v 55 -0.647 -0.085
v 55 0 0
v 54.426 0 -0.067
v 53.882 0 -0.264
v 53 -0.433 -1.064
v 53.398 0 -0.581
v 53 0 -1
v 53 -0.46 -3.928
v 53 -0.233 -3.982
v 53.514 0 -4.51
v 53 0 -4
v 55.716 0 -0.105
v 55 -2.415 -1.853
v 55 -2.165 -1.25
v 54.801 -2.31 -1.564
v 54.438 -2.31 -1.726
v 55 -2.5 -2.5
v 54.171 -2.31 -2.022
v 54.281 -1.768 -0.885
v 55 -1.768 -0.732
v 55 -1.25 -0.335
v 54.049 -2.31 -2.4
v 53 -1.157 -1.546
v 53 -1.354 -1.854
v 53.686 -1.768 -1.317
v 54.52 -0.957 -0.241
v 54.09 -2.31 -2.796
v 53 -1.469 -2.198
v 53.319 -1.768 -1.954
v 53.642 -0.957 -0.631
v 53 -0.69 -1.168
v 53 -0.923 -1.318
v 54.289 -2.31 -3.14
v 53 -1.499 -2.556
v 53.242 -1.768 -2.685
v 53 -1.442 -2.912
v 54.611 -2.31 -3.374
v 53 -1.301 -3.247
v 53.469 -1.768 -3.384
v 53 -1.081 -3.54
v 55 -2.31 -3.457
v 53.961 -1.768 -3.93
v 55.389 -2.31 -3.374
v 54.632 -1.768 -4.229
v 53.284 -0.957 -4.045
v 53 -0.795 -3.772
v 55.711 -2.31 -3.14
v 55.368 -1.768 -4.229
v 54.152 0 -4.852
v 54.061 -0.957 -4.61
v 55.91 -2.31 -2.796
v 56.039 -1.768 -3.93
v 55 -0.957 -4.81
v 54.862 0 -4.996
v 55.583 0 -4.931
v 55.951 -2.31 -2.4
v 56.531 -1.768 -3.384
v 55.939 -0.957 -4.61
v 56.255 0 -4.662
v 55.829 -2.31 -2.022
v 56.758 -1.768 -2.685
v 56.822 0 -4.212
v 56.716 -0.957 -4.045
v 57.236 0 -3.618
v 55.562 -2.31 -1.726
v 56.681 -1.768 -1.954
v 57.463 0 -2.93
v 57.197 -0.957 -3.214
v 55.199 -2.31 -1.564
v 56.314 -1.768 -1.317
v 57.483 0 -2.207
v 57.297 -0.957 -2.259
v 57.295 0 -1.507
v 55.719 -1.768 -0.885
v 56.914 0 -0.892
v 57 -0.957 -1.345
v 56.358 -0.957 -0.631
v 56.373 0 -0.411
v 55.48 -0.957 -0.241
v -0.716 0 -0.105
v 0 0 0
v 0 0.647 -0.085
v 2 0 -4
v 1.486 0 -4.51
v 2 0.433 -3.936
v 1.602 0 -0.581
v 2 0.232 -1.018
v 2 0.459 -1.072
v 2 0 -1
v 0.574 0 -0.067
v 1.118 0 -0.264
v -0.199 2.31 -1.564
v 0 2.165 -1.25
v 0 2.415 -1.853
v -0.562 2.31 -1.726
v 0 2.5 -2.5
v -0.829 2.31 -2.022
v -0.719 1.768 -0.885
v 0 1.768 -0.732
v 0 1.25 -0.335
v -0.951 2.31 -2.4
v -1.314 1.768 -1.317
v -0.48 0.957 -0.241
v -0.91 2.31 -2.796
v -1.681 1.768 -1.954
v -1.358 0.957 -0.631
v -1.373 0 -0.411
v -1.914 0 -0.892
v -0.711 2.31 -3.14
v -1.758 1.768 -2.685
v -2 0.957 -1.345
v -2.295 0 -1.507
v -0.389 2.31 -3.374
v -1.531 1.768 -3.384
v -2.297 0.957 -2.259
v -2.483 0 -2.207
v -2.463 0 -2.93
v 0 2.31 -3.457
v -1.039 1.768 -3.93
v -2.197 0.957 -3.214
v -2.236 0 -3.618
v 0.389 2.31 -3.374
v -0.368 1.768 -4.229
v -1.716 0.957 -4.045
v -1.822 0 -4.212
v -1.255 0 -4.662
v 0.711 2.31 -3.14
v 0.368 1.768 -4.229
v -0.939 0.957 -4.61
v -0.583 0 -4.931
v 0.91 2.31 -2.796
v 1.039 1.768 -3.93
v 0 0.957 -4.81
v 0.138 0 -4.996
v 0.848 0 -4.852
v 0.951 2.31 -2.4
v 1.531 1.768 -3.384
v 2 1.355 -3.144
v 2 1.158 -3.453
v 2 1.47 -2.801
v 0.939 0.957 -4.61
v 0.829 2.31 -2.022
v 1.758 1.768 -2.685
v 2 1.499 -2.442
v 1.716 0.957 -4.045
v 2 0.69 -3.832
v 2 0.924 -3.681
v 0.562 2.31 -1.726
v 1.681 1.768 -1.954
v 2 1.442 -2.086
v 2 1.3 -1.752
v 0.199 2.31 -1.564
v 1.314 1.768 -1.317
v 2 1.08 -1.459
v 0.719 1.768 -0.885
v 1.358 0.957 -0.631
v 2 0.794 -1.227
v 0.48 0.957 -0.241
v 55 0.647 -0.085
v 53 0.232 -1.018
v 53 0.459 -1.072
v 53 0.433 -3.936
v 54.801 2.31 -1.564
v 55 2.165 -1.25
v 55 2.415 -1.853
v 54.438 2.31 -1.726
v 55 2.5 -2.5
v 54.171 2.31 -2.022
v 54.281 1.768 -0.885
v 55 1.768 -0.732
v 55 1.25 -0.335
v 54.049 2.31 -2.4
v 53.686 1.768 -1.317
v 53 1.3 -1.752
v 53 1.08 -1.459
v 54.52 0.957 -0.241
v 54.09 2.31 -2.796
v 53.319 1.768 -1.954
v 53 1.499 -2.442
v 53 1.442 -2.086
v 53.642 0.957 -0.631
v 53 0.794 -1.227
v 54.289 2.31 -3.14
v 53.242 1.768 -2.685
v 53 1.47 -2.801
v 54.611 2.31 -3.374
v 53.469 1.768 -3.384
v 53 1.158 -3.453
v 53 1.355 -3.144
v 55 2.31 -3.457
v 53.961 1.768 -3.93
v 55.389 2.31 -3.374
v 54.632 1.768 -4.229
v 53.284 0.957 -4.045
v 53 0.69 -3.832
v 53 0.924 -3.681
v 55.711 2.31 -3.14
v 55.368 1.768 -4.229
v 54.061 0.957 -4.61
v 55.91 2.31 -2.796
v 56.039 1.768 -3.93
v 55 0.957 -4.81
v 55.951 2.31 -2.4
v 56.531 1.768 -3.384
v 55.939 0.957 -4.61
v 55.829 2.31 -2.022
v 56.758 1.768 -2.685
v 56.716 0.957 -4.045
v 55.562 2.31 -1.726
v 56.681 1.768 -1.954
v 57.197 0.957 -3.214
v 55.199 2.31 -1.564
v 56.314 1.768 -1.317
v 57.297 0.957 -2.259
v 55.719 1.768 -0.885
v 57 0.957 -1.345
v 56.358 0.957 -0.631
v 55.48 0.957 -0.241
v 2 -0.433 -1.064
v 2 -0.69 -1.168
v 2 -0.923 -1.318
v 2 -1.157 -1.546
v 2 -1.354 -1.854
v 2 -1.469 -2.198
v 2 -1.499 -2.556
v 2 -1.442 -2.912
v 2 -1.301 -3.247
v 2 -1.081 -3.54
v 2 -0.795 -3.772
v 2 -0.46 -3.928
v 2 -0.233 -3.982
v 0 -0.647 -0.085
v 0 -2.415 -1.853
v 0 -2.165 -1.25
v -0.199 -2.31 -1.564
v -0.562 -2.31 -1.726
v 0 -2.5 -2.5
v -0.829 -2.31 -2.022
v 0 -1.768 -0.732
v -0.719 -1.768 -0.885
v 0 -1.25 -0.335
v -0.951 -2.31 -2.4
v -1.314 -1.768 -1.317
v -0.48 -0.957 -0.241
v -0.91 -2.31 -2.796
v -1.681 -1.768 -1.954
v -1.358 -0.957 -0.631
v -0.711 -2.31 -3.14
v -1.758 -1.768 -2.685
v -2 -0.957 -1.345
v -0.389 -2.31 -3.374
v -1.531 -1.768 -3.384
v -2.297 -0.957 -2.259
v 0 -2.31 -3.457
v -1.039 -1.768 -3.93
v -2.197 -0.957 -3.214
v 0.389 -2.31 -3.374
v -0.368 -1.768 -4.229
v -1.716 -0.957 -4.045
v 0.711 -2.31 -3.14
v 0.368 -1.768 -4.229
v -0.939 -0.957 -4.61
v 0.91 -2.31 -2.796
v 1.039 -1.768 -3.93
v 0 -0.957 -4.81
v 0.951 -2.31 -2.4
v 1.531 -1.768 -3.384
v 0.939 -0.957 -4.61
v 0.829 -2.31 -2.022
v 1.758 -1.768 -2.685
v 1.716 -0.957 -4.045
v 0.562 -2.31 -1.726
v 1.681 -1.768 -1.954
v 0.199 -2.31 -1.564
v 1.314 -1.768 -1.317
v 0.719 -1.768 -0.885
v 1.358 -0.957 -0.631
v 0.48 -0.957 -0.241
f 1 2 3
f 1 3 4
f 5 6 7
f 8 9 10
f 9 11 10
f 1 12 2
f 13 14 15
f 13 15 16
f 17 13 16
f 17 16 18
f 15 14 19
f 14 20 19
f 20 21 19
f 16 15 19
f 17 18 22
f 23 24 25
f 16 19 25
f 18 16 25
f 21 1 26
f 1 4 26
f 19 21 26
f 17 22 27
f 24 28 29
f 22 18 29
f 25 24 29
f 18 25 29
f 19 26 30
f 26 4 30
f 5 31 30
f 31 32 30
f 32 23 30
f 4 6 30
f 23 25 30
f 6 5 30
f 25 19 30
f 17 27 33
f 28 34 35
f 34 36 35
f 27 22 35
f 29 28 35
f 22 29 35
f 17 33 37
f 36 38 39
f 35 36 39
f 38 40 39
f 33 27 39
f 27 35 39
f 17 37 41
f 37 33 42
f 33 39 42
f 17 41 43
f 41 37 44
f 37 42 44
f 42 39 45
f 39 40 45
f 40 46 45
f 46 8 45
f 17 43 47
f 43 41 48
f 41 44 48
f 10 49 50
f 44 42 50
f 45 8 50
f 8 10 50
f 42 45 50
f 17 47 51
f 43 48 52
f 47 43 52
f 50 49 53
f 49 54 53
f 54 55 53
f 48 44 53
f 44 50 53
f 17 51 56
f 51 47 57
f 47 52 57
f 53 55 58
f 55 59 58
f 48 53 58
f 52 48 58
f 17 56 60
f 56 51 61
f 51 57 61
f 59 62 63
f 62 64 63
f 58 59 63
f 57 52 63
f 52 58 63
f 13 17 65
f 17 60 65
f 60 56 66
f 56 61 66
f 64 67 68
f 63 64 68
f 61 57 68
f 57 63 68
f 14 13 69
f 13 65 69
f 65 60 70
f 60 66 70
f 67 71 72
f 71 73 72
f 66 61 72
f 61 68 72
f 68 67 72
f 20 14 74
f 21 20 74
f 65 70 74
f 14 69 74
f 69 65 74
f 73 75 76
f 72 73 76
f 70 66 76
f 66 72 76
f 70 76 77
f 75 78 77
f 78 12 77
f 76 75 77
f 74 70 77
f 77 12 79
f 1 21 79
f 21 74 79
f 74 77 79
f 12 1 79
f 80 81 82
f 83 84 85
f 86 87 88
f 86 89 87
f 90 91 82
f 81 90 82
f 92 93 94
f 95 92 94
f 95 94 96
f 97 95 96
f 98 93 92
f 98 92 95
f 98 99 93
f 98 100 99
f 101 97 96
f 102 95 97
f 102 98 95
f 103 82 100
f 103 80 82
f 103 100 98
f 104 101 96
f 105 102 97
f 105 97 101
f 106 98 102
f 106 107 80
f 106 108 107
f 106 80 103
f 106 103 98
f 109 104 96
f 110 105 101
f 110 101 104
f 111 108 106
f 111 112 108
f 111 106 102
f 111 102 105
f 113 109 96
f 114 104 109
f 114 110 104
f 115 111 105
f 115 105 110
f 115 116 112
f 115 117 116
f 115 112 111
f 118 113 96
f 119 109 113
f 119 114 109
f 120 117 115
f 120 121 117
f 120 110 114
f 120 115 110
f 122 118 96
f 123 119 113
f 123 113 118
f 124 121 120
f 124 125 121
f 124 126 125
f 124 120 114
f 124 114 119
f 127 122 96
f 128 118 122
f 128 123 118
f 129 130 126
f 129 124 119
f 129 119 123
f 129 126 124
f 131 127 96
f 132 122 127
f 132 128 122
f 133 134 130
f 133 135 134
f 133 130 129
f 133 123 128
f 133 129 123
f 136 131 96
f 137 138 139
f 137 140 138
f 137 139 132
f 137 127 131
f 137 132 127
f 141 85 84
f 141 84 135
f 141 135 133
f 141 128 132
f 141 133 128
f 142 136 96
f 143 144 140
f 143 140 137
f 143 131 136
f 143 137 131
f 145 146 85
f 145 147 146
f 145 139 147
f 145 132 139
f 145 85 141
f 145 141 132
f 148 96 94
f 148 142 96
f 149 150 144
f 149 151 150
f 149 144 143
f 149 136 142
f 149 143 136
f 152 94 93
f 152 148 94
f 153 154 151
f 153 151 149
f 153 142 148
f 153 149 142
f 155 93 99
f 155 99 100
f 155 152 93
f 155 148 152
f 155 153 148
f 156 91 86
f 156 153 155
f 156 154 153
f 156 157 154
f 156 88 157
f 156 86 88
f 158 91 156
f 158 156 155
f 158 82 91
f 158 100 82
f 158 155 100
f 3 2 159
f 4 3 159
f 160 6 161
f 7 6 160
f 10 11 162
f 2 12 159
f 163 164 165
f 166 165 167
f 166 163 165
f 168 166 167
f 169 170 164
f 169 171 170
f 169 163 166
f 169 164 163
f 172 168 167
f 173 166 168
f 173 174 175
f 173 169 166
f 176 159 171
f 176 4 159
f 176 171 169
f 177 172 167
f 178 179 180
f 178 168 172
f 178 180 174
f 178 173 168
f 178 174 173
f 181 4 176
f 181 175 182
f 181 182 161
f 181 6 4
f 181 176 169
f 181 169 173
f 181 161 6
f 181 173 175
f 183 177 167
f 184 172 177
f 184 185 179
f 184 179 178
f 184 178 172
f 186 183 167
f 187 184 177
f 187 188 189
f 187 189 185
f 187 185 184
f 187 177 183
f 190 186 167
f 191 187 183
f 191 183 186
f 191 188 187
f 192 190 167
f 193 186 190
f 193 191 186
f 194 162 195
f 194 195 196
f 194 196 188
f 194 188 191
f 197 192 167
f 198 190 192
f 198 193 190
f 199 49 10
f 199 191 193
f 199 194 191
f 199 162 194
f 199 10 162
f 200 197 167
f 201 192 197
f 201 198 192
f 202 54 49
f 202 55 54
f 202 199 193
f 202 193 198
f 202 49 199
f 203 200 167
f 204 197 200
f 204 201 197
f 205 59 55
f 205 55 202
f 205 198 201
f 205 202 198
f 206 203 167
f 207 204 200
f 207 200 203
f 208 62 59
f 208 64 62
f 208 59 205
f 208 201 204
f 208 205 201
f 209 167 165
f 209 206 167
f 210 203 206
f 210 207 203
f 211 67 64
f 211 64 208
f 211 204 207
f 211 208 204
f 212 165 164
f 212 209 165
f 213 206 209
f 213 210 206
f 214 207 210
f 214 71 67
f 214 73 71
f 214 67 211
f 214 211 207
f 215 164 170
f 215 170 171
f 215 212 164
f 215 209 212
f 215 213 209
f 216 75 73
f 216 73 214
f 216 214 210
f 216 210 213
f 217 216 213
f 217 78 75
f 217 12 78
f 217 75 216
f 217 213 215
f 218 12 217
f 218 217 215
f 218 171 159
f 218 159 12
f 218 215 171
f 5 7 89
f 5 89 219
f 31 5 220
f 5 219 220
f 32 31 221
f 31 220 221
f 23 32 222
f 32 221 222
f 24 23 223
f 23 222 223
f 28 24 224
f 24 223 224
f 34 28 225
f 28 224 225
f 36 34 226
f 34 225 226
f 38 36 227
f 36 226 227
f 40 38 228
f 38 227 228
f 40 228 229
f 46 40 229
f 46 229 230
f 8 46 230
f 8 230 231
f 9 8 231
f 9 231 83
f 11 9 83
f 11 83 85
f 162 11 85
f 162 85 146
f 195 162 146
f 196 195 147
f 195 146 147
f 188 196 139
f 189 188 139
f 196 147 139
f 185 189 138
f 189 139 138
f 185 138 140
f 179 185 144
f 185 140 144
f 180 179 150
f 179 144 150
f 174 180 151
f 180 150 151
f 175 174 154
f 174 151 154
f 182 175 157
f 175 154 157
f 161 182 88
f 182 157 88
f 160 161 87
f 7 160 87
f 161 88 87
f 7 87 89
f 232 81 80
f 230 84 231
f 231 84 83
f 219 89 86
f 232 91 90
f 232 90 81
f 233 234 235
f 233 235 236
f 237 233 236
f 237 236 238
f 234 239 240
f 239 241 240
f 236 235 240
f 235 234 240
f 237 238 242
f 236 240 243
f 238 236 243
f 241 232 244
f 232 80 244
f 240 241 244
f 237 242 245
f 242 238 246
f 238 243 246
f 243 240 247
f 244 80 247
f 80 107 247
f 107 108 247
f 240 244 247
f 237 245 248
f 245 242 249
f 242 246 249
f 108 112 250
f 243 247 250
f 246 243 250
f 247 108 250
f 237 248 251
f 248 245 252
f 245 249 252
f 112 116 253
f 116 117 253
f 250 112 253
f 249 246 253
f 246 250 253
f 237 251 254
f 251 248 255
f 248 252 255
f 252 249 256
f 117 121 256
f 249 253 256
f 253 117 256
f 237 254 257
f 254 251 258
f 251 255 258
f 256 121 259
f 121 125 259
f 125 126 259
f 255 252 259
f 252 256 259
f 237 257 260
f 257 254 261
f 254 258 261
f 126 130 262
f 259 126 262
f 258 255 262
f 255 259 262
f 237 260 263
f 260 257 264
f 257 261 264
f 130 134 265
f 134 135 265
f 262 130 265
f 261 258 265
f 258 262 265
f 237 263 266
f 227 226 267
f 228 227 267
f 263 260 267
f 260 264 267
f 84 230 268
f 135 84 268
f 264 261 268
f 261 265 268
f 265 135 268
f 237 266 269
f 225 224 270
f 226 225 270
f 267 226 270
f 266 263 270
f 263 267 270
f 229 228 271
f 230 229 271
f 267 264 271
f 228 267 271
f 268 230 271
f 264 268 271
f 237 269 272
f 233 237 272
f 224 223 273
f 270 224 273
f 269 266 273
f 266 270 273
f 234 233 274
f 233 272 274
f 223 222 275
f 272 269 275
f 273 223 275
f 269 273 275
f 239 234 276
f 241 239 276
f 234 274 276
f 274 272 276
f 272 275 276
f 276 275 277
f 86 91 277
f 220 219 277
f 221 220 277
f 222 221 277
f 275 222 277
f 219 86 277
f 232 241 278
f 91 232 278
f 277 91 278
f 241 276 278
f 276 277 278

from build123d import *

# Parameters (mm, degrees)
SKETCH5_R   = 1.5
SHAFT_DEPTH = 55


with BuildPart() as part:
    # Sketch4 → Semi-circle Revolve (revolve)
    with BuildSketch(Plane(origin=(0, 0, 0), x_dir=(0, 0, -1), z_dir=(1, 0, 0))):
        with BuildLine():
            Line((0, 0), (2.5, 0))
            Line((2.5, 0), (2.5, -2.5))
            ThreePointArc((2.5, -2.5), (0.732233047, -1.767766953), (0, 0))
        make_face()
    semi_circle_revolve = revolve(axis=Axis((0, 0, -2.5), (0, -1, 0)))

    # Full-circle Mirror: Semi-circle Revolve across plane
    add(semi_circle_revolve.mirror(Plane(origin=(0, 0, 0), x_dir=(0, 0, 1), z_dir=(0, -1, 0))))

    # Sketch5 → Shaft (add)
    with BuildSketch(Plane(origin=(0, 0, 0), x_dir=(0, 0, -1), z_dir=(1, 0, 0))):
        with Locations(Location((2.5, 0, 0), (0, 0, 180))):
            Circle(SKETCH5_R)
    extrude(amount=SHAFT_DEPTH)

    # Sketch6 → Opposite Semi-circle Revolve (revolve)
    with BuildSketch(Plane(origin=(55, 0, 0), x_dir=(0, 0, -1), z_dir=(1, 0, 0))):
        with BuildLine():
            Line((0, 0), (2.5, 0))
            Line((2.5, 0), (2.5, -2.5))
            ThreePointArc((2.5, -2.5), (0.732233047, -1.767766953), (0, 0))
        make_face()
    opposite_semi_circle_revolve = revolve(axis=Axis((55, 0, -2.5), (0, -1, 0)))

    # Opposite Full-circle Mirror: Opposite Semi-circle Revolve across plane
    add(opposite_semi_circle_revolve.mirror(Plane(origin=(55, 0, 0), x_dir=(0, 0, 1), z_dir=(0, 1, 0))))


solid = part.part
